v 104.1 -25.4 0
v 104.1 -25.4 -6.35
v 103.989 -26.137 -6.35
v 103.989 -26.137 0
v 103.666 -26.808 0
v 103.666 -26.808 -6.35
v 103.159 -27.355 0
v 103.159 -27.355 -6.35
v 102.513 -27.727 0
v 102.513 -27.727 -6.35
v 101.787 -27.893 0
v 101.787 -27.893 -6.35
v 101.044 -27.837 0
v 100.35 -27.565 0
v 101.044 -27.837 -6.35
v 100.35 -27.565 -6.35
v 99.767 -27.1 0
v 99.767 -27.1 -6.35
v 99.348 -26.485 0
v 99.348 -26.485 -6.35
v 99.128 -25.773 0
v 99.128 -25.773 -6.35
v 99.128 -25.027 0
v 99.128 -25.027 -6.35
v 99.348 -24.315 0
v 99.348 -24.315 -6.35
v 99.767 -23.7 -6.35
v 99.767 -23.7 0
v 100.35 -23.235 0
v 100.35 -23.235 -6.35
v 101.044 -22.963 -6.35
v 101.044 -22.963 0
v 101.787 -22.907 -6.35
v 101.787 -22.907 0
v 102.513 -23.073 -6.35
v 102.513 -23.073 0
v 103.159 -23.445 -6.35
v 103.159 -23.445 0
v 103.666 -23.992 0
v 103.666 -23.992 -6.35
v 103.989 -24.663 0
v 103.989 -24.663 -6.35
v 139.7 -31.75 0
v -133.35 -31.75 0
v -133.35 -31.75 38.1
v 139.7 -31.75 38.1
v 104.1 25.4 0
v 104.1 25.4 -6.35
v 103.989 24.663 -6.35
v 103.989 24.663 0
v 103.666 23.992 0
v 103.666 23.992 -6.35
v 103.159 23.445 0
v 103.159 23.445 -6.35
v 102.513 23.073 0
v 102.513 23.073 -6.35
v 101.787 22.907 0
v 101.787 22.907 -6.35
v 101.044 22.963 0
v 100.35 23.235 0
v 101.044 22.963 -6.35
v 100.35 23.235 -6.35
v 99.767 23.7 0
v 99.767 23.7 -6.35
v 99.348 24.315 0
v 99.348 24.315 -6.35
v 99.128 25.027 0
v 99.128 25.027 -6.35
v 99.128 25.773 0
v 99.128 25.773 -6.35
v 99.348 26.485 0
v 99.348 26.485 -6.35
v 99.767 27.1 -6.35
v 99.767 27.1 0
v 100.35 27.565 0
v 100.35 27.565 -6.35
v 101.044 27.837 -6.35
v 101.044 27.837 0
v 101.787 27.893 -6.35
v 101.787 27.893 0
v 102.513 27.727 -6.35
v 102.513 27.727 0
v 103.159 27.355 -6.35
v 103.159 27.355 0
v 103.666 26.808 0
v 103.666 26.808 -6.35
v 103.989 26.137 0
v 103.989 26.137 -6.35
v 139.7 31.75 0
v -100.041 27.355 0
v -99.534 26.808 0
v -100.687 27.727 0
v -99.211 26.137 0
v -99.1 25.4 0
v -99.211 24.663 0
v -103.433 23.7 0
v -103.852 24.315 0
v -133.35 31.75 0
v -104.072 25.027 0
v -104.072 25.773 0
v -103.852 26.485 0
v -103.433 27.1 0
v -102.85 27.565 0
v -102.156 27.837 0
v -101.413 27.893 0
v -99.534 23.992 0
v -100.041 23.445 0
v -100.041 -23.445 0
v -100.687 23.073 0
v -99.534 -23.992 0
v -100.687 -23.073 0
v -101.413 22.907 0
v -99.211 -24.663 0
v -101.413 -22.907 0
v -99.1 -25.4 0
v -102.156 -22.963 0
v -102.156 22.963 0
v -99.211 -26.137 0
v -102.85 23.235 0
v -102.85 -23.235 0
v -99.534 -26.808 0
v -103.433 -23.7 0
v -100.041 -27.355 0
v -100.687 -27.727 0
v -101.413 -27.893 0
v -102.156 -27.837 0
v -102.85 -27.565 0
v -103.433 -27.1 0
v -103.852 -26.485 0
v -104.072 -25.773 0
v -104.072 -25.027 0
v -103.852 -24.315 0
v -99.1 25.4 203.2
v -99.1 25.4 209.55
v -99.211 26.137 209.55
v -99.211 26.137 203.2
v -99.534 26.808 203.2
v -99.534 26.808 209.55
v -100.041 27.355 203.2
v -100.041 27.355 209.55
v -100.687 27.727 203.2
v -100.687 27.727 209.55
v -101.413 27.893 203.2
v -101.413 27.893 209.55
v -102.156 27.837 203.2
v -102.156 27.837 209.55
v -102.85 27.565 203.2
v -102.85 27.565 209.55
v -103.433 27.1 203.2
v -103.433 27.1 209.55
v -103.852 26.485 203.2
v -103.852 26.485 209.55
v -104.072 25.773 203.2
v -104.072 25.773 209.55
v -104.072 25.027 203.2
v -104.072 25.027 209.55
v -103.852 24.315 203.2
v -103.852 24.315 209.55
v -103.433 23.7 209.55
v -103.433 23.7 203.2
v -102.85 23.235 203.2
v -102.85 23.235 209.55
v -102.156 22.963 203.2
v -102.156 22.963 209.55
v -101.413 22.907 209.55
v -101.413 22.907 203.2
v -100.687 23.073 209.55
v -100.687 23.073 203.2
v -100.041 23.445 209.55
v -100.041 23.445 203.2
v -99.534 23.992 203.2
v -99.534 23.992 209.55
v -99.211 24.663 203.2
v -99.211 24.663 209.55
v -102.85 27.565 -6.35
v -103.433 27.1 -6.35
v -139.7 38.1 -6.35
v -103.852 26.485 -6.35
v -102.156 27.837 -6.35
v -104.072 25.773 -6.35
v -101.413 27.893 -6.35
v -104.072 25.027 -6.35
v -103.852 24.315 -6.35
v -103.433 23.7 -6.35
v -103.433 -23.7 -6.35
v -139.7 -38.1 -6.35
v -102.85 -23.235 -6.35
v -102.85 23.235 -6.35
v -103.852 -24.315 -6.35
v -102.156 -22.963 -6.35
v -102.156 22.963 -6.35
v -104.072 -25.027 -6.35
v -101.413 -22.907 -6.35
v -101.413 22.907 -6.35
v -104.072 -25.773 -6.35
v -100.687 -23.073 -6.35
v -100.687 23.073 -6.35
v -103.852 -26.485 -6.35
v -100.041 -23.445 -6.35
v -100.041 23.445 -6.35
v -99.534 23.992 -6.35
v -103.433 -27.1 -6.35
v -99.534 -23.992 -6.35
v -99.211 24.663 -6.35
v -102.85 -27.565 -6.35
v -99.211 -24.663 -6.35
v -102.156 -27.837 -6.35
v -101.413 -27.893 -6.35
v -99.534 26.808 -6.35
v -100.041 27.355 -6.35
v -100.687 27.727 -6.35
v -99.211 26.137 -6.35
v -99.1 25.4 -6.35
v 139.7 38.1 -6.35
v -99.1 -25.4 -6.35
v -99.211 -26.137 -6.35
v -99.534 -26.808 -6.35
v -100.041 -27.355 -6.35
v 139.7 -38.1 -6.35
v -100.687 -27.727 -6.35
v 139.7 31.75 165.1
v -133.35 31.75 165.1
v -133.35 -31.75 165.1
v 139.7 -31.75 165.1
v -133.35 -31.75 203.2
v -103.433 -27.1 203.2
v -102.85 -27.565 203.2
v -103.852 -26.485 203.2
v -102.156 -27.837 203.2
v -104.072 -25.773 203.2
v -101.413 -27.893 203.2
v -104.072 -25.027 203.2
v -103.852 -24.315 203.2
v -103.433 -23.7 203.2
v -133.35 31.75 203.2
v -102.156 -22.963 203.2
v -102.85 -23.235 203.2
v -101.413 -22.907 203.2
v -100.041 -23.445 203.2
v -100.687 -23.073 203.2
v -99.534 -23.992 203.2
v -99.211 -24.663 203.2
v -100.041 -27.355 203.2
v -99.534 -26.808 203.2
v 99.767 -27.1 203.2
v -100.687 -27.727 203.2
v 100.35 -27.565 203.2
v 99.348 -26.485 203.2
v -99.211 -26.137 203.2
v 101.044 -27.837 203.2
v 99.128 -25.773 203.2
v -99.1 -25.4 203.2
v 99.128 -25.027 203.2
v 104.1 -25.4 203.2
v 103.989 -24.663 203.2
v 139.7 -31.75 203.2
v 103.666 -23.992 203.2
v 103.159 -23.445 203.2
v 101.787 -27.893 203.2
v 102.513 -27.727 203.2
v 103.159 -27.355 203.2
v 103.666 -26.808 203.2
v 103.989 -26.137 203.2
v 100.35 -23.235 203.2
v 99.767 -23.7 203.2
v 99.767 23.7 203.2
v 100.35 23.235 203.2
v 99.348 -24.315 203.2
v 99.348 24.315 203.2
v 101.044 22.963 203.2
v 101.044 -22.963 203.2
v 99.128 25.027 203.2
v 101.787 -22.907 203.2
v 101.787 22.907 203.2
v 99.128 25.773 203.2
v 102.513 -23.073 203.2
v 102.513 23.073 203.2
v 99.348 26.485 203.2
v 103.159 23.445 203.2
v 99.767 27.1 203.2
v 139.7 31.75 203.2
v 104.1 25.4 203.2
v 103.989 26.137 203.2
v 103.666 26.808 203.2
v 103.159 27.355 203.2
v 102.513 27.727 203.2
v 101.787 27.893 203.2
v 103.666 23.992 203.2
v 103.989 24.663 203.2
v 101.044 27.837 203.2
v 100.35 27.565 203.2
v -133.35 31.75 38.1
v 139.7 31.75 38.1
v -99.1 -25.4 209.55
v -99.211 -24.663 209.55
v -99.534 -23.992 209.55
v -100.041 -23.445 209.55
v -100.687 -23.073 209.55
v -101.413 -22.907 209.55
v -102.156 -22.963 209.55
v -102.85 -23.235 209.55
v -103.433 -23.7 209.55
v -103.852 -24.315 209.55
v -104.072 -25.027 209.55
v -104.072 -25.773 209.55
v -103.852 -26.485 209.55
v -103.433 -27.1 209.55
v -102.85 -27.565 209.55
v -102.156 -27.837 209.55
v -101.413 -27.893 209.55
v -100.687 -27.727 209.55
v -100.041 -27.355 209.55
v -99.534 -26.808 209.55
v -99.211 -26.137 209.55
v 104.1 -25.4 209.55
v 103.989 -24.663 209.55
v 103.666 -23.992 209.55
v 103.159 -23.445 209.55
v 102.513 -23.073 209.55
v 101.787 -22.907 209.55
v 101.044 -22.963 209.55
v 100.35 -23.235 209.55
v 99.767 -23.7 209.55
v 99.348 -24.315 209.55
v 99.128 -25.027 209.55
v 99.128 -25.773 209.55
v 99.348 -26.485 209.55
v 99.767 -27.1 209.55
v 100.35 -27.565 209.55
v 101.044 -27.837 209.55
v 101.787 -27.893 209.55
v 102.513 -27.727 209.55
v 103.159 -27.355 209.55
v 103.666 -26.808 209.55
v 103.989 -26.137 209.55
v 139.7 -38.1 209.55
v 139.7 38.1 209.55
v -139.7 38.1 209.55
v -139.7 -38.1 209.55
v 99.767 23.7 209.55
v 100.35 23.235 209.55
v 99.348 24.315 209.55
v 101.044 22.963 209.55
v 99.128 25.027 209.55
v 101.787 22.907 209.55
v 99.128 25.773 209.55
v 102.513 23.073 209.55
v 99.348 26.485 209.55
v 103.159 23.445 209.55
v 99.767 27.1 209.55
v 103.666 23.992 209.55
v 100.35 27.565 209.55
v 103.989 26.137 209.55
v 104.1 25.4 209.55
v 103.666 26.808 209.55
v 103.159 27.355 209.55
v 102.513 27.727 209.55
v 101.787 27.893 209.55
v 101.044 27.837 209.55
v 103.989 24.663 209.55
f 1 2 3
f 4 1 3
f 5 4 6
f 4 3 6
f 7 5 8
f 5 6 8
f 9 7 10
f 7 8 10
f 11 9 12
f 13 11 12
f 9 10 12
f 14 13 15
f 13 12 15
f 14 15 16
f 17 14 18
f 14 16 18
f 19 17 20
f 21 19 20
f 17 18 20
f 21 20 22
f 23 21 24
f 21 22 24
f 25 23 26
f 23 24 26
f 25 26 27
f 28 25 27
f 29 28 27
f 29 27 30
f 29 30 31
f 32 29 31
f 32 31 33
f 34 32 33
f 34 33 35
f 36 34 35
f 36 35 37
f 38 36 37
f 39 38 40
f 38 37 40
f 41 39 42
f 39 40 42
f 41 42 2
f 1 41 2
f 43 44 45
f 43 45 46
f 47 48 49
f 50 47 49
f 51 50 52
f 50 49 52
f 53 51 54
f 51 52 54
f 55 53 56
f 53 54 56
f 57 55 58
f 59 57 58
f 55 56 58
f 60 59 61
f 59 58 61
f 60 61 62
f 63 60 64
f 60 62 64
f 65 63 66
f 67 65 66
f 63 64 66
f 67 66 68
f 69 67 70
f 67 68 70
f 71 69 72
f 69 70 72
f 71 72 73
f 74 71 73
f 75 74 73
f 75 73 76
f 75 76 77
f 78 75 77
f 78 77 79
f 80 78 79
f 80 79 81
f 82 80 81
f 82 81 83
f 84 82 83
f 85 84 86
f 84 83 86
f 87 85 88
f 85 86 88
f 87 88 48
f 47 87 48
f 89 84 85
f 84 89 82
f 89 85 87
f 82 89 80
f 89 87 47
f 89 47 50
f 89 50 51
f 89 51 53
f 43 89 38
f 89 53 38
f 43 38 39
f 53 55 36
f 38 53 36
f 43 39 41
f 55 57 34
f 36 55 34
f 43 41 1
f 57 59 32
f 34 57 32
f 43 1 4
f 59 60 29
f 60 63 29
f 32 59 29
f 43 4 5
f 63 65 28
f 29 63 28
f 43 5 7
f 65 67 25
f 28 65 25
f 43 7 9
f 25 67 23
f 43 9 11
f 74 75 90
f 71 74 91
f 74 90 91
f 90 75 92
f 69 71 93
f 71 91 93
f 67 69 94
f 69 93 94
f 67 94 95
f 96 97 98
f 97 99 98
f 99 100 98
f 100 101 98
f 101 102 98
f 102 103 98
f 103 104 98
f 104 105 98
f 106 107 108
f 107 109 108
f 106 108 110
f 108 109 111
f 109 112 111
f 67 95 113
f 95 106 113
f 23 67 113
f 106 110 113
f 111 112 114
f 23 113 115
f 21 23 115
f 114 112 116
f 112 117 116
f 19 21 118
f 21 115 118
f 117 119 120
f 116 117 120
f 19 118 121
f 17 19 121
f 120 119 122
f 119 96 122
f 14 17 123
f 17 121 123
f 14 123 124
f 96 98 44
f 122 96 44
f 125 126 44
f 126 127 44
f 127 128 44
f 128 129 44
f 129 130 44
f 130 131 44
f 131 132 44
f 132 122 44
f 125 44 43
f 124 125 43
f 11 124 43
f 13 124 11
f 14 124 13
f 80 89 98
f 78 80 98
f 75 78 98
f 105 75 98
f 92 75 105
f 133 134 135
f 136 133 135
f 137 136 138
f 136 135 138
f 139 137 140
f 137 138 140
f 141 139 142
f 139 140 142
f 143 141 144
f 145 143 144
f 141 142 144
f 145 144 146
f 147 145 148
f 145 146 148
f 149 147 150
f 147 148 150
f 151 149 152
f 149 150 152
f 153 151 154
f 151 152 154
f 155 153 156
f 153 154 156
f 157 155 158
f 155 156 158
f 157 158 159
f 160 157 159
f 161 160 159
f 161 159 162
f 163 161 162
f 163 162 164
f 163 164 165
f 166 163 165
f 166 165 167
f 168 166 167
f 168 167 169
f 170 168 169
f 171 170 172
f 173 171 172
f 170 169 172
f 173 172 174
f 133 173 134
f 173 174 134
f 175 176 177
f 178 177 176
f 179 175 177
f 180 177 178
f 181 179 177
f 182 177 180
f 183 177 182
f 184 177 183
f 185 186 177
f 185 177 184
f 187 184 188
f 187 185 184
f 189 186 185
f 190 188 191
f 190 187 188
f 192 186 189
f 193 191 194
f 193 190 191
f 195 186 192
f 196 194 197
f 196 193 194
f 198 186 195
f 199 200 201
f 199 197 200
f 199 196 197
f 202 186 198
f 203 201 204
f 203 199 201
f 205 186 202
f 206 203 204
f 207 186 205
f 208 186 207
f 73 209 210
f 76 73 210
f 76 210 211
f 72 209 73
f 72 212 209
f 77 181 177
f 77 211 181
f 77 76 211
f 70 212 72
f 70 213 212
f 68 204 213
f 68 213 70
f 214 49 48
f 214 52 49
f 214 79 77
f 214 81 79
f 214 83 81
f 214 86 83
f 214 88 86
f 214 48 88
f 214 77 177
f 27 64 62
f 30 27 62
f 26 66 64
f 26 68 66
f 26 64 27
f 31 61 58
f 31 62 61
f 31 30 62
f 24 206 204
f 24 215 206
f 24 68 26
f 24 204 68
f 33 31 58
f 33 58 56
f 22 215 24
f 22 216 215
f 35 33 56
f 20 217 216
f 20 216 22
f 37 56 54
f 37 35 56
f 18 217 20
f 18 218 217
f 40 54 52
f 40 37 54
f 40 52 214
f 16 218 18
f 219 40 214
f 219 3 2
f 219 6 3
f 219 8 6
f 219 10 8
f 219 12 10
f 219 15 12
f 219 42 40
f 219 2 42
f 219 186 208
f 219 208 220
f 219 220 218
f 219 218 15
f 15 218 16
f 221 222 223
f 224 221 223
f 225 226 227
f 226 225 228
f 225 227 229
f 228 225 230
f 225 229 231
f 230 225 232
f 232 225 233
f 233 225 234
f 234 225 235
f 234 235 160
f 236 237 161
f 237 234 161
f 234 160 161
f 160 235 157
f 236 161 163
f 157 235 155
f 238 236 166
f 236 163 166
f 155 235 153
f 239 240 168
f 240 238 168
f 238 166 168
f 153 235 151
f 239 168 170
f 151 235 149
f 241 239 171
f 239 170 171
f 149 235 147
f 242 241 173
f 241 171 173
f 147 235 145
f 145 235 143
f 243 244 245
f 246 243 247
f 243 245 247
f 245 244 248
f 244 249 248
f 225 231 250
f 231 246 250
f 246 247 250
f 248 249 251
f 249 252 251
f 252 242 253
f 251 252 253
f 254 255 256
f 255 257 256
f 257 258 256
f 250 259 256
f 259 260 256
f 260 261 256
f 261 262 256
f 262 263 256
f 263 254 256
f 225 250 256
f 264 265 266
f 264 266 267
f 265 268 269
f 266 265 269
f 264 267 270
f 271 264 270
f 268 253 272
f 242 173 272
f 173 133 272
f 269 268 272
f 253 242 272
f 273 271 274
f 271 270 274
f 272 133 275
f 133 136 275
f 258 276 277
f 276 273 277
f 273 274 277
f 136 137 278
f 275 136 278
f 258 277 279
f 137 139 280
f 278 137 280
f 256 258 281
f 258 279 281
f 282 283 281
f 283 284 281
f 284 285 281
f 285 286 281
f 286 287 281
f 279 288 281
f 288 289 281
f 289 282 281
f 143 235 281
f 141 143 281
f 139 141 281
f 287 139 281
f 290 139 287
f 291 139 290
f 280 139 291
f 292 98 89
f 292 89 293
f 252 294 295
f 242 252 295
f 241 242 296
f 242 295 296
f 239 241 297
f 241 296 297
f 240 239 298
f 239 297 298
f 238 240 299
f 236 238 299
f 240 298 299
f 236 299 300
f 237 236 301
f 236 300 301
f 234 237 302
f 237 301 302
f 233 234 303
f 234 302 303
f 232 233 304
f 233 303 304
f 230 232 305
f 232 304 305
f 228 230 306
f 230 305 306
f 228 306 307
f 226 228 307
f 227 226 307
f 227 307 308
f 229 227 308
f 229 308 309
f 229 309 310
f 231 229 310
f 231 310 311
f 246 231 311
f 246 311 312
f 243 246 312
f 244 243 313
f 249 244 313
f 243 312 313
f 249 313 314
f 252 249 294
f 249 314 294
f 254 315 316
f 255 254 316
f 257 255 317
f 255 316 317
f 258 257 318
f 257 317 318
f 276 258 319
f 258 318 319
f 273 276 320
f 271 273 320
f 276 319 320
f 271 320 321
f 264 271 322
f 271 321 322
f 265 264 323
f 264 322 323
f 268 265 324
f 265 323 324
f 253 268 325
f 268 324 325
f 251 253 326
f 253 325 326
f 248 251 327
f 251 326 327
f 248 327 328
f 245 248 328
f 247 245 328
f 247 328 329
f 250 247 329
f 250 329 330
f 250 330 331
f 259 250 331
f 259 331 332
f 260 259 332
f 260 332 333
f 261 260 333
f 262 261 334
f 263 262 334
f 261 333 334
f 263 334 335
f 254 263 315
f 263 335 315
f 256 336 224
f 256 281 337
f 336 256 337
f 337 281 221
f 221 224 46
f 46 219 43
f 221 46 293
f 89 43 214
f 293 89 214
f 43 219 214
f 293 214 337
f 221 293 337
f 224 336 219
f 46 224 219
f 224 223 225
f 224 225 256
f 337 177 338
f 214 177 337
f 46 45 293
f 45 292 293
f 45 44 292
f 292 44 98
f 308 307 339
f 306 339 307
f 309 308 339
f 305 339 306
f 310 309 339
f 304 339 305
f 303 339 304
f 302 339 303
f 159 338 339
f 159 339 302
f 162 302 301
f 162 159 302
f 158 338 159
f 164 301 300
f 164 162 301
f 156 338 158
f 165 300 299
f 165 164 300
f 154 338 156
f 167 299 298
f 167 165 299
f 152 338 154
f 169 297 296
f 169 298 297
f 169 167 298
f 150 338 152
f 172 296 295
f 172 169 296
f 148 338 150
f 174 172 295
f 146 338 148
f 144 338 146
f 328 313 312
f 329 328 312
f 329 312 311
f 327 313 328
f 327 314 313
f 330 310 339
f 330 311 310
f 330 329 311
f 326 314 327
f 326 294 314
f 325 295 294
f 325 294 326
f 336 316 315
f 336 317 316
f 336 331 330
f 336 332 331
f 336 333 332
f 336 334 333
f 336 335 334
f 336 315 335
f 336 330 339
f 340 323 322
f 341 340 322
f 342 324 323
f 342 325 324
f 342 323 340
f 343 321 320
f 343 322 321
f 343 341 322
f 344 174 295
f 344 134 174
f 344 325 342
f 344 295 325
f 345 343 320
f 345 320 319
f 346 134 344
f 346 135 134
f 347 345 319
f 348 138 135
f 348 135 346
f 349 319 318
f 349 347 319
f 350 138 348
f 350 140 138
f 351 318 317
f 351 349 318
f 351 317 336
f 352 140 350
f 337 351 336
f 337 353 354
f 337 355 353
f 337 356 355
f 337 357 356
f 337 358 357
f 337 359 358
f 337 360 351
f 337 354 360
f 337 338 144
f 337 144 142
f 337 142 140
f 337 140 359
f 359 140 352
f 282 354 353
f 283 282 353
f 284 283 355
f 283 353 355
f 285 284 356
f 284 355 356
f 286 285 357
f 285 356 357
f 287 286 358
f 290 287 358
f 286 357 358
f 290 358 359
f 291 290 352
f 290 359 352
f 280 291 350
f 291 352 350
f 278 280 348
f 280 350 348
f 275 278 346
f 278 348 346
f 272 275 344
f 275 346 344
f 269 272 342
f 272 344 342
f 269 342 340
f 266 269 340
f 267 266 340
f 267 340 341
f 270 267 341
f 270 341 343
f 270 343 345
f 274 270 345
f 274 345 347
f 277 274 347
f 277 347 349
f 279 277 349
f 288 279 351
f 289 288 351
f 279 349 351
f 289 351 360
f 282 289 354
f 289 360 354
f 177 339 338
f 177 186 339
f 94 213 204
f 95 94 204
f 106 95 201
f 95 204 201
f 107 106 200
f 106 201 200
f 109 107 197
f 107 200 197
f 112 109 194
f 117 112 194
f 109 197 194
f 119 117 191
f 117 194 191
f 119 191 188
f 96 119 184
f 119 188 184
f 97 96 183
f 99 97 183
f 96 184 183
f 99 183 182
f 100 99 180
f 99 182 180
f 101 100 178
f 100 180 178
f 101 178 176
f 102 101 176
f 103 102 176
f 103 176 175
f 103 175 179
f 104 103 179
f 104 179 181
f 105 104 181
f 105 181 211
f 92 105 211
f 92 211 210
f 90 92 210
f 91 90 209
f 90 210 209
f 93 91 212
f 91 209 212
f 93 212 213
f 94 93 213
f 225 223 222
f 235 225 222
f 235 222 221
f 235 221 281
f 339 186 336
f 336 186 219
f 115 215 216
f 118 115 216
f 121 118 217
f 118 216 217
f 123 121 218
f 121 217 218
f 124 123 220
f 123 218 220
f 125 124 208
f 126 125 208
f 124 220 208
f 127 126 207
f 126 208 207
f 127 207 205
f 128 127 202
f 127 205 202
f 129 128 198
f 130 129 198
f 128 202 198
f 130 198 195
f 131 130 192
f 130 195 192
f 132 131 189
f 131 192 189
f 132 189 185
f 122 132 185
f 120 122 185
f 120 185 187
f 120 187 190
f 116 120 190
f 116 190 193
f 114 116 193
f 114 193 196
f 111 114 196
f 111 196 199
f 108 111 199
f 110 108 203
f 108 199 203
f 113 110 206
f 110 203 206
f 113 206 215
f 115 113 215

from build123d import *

# Parameters (mm, degrees)
F0_W      = 279.4
F0_H      = 76.2
F0_W_2    = 266.7
F0_H_2    = 63.5
F1_DEPTH  = 38.1
F2_W      = 279.4
F2_H      = 76.2
F3_DEPTH  = 6.35
F4_W      = 63.5
F4_H      = 38.1
F5_DEPTH  = 25
F6_W      = 279.4
F6_H      = 76.2
F7_DEPTH  = 127
F8_W      = 279.4
F8_H      = 76.2
F8_W_2    = 266.7
F8_H_2    = 63.5
F9_DEPTH  = 38.1
F10_W     = 63.5
F10_H     = 38.1
F11_DEPTH = 25
F12_W     = 279.4
F12_H     = 76.2
F13_DEPTH = 6.35
F14_R     = 2.5
F15_DEPTH = 6.35
F16_R     = 2.5
F17_DEPTH = 6.35


with BuildPart() as f1:
    # F0 (on Top) → F1 (new body)
    with BuildSketch(Plane.XY):
        Rectangle(F0_W, F0_H)
        Rectangle(F0_W_2, F0_H_2, mode=Mode.SUBTRACT)
    extrude(amount=F1_DEPTH)

    # F2 (on face) → F3 (join)
    with BuildSketch(Plane(origin=(0, 0, 0), x_dir=(1, 0, 0), z_dir=(0, 0, -1))):
        Rectangle(F2_W, F2_H)
    extrude(amount=F3_DEPTH)

    # F4 (on face) → F5 (cut)
    with BuildSketch(Plane(origin=(133.35, 0, 0), x_dir=(0, -1, 0), z_dir=(-1, 0, 0))):
        with Locations((0, 19.05)):
            Rectangle(F4_W, F4_H)
    extrude(amount=-F5_DEPTH, mode=Mode.SUBTRACT)

    # F6 (on face) → F7 (join)
    with BuildSketch(Plane.XY.offset(38.1)):
        Rectangle(F6_W, F6_H)
    extrude(amount=F7_DEPTH)

    # F8 (on face) → F9 (join)
    with BuildSketch(Plane.XY.offset(165.1)):
        Rectangle(F8_W, F8_H)
        Rectangle(F8_W_2, F8_H_2, mode=Mode.SUBTRACT)
    extrude(amount=F9_DEPTH)

    # F10 (on face) → F11 (cut)
    with BuildSketch(Plane(origin=(133.35, 0, 0), x_dir=(0, -1, 0), z_dir=(-1, 0, 0))):
        with Locations((0, 184.15)):
            Rectangle(F10_W, F10_H)
    extrude(amount=-F11_DEPTH, mode=Mode.SUBTRACT)

    # F12 (on face) → F13 (join)
    with BuildSketch(Plane.XY.offset(203.2)):
        Rectangle(F12_W, F12_H)
    extrude(amount=F13_DEPTH)

    # F14 (on face) → F15 (cut, through all)
    with BuildSketch(Plane.XY.offset(209.55)):
        with Locations((101.6, 25.4)):
            Circle(F14_R)
        with Locations((101.6, -25.4)):
            Circle(F14_R)
        with Locations((-101.6, 25.4)):
            Circle(F14_R)
        with Locations((-101.6, -25.4)):
            Circle(F14_R)
    extrude(amount=-F15_DEPTH, mode=Mode.SUBTRACT)

    # F16 (on face) → F17 (cut, through all)
    with BuildSketch(Plane(origin=(0, 0, -6.35), x_dir=(1, 0, 0), z_dir=(0, 0, -1))):
        with Locations((-101.6, -25.4)):
            Circle(F16_R)
        with Locations((-101.6, 25.4)):
            Circle(F16_R)
        with Locations((101.6, -25.4)):
            Circle(F16_R)
        with Locations((101.6, 25.4)):
            Circle(F16_R)
    extrude(amount=-F17_DEPTH, mode=Mode.SUBTRACT)


solid = f1.part
